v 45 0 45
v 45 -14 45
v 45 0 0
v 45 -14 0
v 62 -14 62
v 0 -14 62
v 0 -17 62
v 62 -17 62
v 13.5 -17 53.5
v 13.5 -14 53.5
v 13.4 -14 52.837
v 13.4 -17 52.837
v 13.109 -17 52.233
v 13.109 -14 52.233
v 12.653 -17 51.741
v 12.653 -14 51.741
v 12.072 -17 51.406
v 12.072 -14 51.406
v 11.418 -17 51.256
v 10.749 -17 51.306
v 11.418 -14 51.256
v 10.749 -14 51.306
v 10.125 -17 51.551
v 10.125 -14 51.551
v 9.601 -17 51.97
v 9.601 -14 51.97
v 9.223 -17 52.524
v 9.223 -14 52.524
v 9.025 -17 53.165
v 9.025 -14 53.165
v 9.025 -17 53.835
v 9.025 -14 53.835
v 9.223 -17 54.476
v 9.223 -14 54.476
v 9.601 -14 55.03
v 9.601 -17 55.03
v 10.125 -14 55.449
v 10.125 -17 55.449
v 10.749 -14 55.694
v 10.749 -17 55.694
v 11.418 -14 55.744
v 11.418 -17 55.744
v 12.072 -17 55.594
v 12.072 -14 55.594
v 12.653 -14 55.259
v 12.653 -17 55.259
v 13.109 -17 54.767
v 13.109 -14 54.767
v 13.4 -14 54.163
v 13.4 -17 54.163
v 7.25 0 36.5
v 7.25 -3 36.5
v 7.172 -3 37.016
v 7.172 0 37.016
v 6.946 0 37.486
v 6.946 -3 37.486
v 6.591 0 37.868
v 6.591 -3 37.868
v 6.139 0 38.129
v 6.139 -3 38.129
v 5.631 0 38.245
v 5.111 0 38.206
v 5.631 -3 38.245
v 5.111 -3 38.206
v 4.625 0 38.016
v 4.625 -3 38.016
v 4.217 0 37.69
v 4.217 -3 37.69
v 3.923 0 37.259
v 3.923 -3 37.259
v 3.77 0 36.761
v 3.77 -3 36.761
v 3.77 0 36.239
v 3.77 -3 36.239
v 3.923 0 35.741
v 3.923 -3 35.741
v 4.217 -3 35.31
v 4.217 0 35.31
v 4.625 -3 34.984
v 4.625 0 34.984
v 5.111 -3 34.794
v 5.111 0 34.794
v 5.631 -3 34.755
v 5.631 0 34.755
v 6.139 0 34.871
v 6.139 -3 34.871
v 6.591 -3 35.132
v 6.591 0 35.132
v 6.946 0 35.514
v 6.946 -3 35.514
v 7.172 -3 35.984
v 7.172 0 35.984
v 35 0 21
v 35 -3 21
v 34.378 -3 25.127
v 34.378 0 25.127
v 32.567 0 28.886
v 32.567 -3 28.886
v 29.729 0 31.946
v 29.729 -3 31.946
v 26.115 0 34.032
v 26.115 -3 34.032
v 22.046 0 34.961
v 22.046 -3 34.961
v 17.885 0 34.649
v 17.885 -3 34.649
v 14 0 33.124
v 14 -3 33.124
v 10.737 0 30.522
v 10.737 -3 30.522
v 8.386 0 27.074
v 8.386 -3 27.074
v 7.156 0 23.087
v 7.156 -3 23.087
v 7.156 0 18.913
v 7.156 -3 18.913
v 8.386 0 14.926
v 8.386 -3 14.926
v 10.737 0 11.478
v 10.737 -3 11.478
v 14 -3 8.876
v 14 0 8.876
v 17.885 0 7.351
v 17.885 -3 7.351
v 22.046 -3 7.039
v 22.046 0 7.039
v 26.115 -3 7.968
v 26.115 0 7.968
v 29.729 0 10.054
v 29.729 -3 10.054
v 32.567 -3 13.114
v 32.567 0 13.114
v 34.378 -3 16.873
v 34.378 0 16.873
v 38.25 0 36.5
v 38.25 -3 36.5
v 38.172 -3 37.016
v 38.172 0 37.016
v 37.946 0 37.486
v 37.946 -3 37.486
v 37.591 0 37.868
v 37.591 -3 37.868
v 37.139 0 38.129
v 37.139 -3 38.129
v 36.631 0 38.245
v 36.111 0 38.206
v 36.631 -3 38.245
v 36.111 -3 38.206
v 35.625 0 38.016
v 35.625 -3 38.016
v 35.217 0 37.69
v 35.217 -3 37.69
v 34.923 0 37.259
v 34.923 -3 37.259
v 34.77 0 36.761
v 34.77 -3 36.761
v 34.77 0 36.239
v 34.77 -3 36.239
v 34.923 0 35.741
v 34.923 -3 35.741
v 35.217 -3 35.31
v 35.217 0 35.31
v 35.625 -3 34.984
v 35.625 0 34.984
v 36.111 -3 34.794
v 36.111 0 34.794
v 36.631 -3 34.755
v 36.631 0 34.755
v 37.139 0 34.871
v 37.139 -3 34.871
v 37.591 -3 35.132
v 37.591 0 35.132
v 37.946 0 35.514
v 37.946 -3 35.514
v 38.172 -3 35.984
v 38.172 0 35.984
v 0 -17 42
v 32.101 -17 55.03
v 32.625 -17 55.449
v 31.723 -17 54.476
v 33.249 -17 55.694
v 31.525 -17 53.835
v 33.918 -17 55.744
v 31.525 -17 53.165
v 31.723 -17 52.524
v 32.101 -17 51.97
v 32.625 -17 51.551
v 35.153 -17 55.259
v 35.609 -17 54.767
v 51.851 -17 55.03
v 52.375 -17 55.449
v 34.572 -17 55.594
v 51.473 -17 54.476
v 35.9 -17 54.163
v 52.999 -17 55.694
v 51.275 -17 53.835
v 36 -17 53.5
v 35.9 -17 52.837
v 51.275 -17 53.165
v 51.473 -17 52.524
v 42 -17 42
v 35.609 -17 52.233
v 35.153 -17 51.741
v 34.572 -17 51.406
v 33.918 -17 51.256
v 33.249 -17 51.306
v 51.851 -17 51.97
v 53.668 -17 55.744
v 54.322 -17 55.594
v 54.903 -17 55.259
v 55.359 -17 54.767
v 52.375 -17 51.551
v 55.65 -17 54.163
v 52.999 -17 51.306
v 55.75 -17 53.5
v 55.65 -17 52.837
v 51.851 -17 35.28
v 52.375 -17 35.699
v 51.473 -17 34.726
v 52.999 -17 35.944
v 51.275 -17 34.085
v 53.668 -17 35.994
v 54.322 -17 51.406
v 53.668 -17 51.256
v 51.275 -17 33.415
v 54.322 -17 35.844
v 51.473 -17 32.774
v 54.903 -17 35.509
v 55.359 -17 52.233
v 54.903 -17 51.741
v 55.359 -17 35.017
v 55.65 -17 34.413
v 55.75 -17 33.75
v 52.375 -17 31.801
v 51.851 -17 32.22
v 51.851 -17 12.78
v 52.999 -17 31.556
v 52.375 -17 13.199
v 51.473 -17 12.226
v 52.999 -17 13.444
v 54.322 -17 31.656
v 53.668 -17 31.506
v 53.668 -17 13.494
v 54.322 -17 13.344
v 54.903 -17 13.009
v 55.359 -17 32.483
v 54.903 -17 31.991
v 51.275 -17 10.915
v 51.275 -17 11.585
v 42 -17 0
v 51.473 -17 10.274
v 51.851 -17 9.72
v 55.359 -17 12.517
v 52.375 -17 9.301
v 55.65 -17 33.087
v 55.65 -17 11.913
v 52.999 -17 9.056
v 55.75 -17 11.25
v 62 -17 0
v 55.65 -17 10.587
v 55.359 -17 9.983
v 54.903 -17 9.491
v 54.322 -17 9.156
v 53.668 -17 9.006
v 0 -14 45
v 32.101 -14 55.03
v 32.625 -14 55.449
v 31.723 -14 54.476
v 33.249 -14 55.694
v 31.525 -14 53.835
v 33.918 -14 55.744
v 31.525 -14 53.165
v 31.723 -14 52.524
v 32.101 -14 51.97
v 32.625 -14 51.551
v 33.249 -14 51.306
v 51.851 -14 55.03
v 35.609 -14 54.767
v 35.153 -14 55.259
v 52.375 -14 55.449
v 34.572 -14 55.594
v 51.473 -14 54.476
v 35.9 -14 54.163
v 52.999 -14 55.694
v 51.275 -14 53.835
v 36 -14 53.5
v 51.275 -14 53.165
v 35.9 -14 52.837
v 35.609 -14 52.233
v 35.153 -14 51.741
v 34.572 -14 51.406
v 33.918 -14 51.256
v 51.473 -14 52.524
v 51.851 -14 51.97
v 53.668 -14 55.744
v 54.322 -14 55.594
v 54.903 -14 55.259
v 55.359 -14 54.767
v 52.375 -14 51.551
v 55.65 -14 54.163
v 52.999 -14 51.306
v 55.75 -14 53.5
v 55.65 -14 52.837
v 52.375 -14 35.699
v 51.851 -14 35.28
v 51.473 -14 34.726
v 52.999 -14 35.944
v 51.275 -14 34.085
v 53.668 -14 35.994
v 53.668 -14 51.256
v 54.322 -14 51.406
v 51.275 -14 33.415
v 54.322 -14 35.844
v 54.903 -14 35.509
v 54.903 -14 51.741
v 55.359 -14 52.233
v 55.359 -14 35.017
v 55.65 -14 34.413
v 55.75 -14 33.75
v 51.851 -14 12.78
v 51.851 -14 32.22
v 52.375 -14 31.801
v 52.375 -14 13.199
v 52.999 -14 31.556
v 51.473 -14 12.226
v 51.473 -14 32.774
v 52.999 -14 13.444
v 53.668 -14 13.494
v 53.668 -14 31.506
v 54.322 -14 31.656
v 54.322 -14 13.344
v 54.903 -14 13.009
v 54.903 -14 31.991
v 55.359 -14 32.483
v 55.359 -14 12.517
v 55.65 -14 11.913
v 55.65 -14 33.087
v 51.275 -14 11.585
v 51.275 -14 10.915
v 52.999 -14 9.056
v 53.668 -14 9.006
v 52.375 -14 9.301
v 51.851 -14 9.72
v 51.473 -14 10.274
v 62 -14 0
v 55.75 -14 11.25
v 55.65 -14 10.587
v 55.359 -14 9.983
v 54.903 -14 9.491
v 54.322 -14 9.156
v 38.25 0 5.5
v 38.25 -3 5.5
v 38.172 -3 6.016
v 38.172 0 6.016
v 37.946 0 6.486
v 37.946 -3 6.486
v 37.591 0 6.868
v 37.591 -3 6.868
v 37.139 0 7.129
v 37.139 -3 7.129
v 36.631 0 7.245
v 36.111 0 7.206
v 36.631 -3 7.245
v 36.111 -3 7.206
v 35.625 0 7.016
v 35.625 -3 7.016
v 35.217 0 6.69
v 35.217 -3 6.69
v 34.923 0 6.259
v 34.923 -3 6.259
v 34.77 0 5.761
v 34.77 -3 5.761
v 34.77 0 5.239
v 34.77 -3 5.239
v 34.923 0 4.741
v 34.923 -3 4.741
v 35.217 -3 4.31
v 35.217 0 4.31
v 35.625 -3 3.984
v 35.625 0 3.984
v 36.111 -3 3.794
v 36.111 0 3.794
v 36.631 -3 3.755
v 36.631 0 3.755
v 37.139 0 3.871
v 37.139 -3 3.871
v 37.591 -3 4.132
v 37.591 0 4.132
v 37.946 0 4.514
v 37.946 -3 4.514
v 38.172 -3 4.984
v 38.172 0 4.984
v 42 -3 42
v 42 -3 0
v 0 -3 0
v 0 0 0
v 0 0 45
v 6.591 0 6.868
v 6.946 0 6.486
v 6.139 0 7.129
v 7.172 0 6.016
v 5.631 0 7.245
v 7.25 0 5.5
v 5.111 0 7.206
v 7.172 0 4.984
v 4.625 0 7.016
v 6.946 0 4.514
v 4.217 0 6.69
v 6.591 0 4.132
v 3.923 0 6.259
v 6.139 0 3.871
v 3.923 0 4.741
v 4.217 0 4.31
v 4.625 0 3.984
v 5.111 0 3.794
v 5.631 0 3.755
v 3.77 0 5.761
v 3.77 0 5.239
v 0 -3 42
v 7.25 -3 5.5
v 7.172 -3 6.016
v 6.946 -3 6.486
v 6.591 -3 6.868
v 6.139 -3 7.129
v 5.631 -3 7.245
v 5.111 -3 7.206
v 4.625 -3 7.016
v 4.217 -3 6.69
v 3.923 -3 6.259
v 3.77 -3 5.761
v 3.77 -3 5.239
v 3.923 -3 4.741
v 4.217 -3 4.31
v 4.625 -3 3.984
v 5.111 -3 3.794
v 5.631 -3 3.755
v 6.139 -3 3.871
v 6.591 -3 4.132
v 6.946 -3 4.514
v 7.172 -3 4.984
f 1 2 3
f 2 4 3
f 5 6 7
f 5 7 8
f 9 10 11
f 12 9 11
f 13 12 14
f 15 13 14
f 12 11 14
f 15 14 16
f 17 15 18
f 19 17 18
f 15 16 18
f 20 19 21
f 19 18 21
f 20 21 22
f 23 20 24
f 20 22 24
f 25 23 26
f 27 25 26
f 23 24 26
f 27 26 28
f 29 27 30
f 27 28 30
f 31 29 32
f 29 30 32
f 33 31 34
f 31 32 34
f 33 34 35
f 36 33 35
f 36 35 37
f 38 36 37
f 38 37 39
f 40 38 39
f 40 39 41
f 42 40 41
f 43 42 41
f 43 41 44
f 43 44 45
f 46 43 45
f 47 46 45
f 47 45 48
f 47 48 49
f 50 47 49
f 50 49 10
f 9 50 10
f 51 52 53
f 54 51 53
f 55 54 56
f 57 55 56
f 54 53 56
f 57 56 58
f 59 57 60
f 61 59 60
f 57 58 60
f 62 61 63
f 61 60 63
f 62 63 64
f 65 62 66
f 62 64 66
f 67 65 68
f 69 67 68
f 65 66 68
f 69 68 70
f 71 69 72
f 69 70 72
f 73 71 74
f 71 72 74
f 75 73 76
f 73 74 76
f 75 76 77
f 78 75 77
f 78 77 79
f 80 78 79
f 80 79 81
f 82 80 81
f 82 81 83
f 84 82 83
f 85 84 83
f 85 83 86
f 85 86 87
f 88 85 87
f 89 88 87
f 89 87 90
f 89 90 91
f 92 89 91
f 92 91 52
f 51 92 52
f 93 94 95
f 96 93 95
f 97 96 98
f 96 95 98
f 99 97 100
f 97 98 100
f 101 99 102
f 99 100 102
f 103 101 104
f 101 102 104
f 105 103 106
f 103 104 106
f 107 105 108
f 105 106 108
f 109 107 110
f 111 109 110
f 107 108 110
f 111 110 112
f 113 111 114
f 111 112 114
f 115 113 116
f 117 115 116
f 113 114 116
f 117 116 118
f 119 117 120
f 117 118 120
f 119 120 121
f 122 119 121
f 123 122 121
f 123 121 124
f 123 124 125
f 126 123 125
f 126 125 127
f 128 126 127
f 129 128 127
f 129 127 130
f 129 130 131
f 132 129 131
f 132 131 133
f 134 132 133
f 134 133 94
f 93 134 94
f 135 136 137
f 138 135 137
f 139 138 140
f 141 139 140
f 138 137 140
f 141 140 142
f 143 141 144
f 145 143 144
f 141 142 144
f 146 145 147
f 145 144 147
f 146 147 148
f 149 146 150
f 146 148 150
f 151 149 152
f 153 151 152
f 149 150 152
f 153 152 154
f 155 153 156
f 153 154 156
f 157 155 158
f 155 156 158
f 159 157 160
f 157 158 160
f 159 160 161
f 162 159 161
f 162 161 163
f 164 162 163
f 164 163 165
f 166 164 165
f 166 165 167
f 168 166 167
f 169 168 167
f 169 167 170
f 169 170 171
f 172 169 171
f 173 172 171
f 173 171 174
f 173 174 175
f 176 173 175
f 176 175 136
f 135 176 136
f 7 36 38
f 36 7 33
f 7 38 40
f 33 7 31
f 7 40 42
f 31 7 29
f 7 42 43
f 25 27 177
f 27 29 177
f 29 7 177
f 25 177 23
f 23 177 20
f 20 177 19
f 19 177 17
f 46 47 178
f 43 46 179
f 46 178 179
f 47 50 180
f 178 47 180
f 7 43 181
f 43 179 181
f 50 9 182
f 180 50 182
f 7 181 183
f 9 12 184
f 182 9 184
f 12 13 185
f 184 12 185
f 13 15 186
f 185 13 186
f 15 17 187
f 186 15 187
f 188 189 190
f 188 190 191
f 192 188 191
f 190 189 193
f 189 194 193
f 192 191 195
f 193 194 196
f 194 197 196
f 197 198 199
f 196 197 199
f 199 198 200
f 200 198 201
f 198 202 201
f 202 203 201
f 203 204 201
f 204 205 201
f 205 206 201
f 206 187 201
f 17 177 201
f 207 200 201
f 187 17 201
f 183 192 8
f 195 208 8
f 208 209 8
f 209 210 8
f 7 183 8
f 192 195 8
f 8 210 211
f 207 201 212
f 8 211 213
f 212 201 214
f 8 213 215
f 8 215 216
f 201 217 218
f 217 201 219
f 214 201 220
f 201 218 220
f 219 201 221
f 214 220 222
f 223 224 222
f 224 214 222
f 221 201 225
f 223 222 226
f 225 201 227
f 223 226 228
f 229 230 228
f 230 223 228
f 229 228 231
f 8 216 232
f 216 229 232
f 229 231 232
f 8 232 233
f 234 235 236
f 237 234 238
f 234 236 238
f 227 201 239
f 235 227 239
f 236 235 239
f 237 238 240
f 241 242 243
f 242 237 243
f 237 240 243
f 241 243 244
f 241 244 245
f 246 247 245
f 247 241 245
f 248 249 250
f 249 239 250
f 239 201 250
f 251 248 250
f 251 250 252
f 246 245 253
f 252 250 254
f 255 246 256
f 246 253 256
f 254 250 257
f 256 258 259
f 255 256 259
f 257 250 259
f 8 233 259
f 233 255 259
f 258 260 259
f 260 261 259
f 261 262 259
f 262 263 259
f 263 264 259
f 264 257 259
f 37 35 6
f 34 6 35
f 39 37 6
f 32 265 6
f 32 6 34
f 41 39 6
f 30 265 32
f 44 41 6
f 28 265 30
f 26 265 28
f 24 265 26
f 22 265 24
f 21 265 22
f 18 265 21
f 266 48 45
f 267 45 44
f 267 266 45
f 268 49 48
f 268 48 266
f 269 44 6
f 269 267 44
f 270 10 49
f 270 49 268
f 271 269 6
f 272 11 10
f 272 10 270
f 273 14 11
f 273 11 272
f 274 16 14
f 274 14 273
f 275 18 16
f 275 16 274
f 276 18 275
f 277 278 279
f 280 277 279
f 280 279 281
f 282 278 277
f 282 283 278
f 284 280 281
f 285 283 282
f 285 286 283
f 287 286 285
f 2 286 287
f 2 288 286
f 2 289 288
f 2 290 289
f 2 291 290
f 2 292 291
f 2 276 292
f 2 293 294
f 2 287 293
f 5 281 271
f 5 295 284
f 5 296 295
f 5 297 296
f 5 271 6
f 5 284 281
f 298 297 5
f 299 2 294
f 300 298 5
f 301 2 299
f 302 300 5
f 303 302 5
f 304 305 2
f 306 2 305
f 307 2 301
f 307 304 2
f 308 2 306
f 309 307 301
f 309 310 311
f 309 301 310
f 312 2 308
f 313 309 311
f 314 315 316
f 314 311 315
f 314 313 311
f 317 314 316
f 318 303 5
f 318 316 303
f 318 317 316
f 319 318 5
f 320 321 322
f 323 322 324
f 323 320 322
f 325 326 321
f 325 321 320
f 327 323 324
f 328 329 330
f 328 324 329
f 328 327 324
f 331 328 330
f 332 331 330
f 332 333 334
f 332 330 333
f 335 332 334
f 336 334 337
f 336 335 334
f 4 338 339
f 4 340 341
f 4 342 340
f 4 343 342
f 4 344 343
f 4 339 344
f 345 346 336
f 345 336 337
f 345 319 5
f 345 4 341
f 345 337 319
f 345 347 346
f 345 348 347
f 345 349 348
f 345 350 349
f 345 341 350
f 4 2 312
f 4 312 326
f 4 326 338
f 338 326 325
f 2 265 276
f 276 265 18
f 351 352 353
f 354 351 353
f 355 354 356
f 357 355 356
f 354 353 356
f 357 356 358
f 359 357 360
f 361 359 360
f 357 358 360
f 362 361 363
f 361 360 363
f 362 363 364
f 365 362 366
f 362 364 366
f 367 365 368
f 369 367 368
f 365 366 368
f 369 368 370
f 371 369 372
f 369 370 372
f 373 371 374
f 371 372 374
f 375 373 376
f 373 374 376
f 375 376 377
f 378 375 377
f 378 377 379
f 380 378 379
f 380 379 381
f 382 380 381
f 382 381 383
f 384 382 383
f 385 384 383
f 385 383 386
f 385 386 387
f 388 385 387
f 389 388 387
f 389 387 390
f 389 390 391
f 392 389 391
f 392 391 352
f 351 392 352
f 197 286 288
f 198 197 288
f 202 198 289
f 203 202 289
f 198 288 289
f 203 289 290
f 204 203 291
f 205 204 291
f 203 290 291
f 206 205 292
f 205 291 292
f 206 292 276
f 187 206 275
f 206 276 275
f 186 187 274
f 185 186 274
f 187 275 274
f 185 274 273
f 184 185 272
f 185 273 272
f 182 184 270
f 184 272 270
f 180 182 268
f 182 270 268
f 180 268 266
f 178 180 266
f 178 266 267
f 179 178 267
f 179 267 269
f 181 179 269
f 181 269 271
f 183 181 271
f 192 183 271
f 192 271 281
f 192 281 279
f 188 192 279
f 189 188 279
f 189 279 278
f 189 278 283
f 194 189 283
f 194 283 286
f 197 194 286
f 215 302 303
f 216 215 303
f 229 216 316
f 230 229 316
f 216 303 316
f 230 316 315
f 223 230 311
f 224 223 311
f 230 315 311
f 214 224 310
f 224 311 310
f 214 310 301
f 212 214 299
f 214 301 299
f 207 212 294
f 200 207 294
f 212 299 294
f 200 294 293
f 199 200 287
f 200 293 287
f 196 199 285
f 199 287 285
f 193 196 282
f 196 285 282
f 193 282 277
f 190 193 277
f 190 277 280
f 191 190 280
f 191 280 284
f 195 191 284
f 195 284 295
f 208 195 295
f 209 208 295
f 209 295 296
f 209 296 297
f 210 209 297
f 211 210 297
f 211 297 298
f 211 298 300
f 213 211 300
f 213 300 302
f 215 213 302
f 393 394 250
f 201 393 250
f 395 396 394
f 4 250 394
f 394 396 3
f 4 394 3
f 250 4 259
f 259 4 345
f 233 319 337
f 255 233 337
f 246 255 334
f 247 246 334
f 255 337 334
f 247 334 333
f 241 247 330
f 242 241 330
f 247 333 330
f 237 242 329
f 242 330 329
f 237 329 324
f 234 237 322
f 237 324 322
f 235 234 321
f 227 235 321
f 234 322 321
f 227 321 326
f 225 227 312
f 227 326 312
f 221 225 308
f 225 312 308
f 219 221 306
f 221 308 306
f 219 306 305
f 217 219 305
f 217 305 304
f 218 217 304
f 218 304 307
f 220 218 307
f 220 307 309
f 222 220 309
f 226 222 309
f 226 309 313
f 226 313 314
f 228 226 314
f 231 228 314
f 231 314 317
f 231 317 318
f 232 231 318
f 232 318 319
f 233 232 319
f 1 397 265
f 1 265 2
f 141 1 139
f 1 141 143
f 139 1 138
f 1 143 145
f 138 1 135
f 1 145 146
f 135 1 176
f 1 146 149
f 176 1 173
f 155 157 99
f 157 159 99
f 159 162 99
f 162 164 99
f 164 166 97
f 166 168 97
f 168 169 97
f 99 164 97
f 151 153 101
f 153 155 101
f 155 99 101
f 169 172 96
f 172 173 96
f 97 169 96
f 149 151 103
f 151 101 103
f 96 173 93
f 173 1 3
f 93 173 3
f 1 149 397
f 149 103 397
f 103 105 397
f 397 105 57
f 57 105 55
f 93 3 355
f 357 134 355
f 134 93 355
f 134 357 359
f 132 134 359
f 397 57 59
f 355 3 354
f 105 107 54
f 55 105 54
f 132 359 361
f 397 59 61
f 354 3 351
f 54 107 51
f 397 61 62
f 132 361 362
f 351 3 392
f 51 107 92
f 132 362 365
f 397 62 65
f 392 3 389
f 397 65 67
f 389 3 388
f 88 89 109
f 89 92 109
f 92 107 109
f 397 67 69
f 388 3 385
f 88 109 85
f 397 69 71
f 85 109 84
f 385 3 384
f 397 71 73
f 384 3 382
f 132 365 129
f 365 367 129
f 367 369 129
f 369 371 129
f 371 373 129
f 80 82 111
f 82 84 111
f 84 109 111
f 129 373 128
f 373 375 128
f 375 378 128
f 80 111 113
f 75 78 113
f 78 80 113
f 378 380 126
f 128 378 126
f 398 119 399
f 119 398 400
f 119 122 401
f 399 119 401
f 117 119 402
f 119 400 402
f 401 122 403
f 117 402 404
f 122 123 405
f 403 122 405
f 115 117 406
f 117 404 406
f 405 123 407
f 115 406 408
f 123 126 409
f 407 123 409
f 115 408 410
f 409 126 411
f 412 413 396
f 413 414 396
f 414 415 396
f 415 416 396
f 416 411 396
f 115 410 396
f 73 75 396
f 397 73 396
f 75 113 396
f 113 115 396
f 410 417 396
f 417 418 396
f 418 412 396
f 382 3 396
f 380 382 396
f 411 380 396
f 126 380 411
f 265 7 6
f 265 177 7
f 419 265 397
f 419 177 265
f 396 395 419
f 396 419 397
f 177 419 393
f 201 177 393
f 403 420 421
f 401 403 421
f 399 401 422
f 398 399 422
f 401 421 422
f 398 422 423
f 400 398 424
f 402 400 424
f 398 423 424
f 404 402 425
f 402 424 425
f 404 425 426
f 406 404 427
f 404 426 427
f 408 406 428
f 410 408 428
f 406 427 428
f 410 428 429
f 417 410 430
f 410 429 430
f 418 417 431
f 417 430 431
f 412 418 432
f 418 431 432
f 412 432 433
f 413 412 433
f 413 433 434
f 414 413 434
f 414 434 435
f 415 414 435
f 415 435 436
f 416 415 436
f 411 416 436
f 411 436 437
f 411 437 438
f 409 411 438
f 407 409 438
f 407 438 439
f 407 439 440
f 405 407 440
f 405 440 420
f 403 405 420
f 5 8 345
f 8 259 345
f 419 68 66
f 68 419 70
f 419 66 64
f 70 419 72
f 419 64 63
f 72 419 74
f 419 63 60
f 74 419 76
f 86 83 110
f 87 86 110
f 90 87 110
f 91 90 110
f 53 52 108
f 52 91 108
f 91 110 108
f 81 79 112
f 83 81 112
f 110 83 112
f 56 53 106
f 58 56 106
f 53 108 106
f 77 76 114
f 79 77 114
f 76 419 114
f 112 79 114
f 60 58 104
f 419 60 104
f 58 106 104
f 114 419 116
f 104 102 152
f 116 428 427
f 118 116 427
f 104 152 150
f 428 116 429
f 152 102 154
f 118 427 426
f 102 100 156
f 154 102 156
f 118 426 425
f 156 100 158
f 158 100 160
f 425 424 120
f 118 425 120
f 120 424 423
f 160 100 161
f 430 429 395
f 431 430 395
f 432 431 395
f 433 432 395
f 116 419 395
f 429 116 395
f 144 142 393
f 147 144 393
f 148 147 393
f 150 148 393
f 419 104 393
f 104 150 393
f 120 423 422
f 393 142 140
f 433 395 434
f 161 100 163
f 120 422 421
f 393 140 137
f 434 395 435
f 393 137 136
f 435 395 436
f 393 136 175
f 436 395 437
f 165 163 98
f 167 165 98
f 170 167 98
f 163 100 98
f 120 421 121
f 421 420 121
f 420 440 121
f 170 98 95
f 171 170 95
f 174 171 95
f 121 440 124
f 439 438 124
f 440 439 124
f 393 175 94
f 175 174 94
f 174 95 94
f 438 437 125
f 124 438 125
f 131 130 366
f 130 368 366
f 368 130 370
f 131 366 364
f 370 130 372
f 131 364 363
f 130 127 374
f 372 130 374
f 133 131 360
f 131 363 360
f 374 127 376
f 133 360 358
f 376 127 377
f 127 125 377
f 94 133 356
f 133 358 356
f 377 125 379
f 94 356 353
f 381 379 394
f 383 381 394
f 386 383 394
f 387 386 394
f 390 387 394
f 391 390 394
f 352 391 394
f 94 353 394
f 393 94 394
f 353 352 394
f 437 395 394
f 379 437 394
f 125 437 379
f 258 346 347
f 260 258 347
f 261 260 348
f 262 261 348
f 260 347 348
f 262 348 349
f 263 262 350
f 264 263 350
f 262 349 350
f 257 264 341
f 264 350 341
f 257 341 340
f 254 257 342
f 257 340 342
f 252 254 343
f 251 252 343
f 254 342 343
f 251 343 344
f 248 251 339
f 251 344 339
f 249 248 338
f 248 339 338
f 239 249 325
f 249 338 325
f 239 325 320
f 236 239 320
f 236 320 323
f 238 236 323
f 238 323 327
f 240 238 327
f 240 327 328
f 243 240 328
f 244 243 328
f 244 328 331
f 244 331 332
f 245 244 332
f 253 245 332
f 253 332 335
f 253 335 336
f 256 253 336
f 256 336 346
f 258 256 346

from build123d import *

# Parameters (mm, degrees)
BOSS_EXTRUDE6_DEPTH = 42
SKETCH9_W           = 42
SKETCH9_H           = 14
BOSS_EXTRUDE7_DEPTH = 3
SKETCH10_W          = 62
SKETCH10_H          = 3
BOSS_EXTRUDE8_DEPTH = 17
SKETCH11_R          = 1.75
SKETCH11_R_2        = 14
CUT_EXTRUDE3_DEPTH  = 4
SKETCH12_R          = 2.25
CUT_EXTRUDE4_DEPTH  = 4


with BuildPart() as part:
    # Sketch7 → Boss-Extrude6 (new body)
    with BuildSketch(Plane.XY):
        Polygon((42, -17), (62, -17), (62, -14), (45, -14), (45, 0), (0, 0), (0, -3), (42, -3), align=None)
    extrude(amount=BOSS_EXTRUDE6_DEPTH)

    # Sketch9 → Boss-Extrude7 (add)
    with BuildSketch(Plane.XY.offset(42)):
        with Locations((21, -10)):
            Rectangle(SKETCH9_W, SKETCH9_H)
        Polygon((45, -14), (45, 0), (0, 0), (0, -3), (42, -3), (42, -17), (62, -17), (62, -14), align=None)
    extrude(amount=BOSS_EXTRUDE7_DEPTH)

    # Sketch10 → Boss-Extrude8 (add)
    with BuildSketch(Plane.XY.offset(45)):
        with Locations((31, -15.5)):
            Rectangle(SKETCH10_W, SKETCH10_H)
    extrude(amount=BOSS_EXTRUDE8_DEPTH)

    # Sketch11 → Cut-Extrude3 (cut, through all)
    with BuildSketch(Plane.XZ.offset(3)):
        with Locations((5.5, 36.5)):
            Circle(SKETCH11_R)
        with Locations((36.5, 36.5)):
            Circle(SKETCH11_R)
        with Locations((36.5, 5.5)):
            Circle(SKETCH11_R)
        with Locations((5.5, 5.5)):
            Circle(SKETCH11_R)
        with Locations((21, 21)):
            Circle(SKETCH11_R_2)
    extrude(amount=-CUT_EXTRUDE3_DEPTH, mode=Mode.SUBTRACT)

    # Sketch12 → Cut-Extrude4 (cut, through all)
    with BuildSketch(Plane(origin=(0, -14, 0), x_dir=(1, 0, 0), z_dir=(0, 1, 0))):
        with Locations((11.25, -53.5)):
            Circle(SKETCH12_R)
        with Locations((33.75, -53.5)):
            Circle(SKETCH12_R)
        with Locations((53.5, -53.5)):
            Circle(SKETCH12_R)
        with Locations((53.5, -11.25)):
            Circle(SKETCH12_R)
        with Locations((53.5, -33.75)):
            Circle(SKETCH12_R)
    extrude(amount=-CUT_EXTRUDE4_DEPTH, mode=Mode.SUBTRACT)


solid = part.part
